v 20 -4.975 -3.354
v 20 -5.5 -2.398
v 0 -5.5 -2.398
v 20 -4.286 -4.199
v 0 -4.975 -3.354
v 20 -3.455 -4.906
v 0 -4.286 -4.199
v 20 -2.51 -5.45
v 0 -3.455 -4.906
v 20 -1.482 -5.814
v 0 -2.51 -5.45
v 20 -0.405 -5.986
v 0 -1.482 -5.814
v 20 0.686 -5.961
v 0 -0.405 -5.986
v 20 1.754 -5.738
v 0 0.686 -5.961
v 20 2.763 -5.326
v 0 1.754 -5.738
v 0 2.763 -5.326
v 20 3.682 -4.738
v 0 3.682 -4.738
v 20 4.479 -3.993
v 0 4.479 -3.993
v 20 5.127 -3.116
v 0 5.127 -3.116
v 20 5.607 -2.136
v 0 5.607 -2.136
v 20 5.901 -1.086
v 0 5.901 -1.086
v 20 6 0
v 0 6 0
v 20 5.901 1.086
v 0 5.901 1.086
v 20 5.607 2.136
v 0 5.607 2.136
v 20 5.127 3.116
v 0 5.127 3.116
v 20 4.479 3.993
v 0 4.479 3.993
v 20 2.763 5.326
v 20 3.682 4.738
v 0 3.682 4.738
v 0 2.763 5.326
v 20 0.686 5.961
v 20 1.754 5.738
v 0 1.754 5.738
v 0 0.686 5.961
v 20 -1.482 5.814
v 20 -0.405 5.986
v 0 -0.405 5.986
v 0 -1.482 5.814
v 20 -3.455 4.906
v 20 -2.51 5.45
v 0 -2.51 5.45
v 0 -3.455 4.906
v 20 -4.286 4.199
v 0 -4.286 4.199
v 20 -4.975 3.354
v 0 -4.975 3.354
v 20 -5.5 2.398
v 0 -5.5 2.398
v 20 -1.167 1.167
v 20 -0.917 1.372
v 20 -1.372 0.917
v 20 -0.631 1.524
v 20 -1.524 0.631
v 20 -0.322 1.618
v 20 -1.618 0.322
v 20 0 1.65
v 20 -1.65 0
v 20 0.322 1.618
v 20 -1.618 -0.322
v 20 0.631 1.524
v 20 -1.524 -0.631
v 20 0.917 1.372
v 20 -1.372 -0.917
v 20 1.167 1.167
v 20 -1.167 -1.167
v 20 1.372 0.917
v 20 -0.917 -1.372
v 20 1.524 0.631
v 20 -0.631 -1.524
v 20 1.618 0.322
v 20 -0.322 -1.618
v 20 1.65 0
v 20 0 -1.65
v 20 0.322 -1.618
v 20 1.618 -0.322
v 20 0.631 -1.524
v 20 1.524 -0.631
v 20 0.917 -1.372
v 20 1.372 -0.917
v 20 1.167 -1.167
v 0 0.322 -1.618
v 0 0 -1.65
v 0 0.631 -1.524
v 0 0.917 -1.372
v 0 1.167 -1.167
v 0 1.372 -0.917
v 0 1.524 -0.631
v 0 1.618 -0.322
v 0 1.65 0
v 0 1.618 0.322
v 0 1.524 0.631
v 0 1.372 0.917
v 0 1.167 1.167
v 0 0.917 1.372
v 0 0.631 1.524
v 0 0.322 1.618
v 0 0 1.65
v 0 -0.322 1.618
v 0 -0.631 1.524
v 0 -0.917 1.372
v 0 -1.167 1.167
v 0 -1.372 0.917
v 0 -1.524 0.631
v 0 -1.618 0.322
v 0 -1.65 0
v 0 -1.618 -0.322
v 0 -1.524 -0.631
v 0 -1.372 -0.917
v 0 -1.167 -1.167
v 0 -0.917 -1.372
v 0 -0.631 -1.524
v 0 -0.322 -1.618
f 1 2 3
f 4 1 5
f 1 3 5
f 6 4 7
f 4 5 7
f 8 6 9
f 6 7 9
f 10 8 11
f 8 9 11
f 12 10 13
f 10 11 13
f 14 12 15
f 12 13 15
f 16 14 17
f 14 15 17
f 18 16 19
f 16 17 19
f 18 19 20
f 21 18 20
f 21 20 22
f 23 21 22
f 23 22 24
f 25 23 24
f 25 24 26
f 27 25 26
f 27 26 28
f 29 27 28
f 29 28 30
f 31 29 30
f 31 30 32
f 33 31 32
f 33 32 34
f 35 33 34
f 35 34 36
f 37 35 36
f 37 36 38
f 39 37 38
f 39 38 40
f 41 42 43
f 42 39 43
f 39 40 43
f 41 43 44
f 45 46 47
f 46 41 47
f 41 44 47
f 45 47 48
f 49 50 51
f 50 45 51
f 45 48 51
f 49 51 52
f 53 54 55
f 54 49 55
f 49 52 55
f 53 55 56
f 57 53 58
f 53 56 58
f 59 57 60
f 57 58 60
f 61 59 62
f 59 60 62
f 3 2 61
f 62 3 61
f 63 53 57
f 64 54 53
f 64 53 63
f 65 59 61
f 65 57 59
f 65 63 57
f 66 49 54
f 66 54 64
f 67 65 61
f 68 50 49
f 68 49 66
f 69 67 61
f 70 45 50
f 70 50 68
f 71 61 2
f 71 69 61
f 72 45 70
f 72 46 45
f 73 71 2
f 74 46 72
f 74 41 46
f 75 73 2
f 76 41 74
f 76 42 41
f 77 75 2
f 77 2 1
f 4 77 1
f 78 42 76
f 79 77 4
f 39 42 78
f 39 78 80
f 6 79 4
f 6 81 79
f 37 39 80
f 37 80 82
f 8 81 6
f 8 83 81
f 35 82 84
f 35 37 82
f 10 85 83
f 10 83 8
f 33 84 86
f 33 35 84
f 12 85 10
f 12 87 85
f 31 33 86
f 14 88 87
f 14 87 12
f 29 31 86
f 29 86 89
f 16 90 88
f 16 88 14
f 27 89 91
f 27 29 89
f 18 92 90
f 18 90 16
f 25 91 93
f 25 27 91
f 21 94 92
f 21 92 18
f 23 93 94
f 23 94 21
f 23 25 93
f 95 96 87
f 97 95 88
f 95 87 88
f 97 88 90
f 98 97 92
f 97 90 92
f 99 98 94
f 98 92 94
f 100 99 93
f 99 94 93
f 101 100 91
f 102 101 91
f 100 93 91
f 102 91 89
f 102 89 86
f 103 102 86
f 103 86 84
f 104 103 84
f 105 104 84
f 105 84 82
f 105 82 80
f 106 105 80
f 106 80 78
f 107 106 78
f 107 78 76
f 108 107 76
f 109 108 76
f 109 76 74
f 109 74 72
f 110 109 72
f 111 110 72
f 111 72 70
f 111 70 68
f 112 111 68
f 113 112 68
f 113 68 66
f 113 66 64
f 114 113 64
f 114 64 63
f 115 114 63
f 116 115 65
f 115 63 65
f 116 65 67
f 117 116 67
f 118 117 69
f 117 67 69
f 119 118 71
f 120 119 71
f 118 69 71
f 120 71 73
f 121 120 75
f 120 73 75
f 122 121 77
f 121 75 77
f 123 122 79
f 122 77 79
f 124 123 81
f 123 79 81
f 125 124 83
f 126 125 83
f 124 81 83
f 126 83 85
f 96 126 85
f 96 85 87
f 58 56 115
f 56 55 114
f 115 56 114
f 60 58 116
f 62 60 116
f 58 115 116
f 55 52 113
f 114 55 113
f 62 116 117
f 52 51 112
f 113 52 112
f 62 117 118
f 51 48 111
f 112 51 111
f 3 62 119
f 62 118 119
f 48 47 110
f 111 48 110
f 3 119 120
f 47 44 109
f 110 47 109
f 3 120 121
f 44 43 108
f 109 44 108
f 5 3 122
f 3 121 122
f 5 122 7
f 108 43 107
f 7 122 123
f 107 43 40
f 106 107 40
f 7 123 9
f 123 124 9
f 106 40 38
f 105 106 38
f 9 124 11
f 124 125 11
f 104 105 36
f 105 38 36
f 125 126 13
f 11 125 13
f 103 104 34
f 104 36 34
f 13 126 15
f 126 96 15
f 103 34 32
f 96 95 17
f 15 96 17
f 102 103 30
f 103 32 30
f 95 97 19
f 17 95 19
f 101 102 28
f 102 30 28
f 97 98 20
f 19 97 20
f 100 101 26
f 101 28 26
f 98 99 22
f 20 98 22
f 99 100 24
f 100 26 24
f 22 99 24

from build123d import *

# Parameters (mm, degrees)
SKETCH_1_R          = 6
EXTRUDE_1_DEPTH     = 20
SKETCH_3_R          = 1.65
CUT_EXTRUDE_2_DEPTH = 22.725560982
CUT_EXTRUDE_1_DEPTH = 22.725560982


with BuildPart() as part:
    # ｽｹｯﾁ1 → ﾎﾞｽ - 押し出し1 (new body)
    with BuildSketch(Plane(origin=(0, 0, 0), x_dir=(0, 0, -1), z_dir=(1, 0, 0))):
        Circle(SKETCH_1_R)
    extrude(amount=EXTRUDE_1_DEPTH)

    # ｽｹｯﾁ3 → ｶｯﾄ - 押し出し2 (cut, through all)
    with BuildSketch(Plane(origin=(20, 0, 0), x_dir=(0, 0, -1), z_dir=(1, 0, 0))):
        Circle(SKETCH_3_R)
    extrude(amount=-CUT_EXTRUDE_2_DEPTH, mode=Mode.SUBTRACT)

    # ｽｹｯﾁ2 → ｶｯﾄ - 押し出し1 (cut, through all)
    with BuildSketch(Plane(origin=(20, 0, 0), x_dir=(0, 0, -1), z_dir=(1, 0, 0))):
        with BuildLine():
            Line((2.397915762, -5.5), (-2.397915762, -5.5))
            ThreePointArc((-2.397915762, -5.5), (0, -6), (2.397915762, -5.5))
        make_face()
    extrude(amount=-CUT_EXTRUDE_1_DEPTH, mode=Mode.SUBTRACT)


solid = part.part
